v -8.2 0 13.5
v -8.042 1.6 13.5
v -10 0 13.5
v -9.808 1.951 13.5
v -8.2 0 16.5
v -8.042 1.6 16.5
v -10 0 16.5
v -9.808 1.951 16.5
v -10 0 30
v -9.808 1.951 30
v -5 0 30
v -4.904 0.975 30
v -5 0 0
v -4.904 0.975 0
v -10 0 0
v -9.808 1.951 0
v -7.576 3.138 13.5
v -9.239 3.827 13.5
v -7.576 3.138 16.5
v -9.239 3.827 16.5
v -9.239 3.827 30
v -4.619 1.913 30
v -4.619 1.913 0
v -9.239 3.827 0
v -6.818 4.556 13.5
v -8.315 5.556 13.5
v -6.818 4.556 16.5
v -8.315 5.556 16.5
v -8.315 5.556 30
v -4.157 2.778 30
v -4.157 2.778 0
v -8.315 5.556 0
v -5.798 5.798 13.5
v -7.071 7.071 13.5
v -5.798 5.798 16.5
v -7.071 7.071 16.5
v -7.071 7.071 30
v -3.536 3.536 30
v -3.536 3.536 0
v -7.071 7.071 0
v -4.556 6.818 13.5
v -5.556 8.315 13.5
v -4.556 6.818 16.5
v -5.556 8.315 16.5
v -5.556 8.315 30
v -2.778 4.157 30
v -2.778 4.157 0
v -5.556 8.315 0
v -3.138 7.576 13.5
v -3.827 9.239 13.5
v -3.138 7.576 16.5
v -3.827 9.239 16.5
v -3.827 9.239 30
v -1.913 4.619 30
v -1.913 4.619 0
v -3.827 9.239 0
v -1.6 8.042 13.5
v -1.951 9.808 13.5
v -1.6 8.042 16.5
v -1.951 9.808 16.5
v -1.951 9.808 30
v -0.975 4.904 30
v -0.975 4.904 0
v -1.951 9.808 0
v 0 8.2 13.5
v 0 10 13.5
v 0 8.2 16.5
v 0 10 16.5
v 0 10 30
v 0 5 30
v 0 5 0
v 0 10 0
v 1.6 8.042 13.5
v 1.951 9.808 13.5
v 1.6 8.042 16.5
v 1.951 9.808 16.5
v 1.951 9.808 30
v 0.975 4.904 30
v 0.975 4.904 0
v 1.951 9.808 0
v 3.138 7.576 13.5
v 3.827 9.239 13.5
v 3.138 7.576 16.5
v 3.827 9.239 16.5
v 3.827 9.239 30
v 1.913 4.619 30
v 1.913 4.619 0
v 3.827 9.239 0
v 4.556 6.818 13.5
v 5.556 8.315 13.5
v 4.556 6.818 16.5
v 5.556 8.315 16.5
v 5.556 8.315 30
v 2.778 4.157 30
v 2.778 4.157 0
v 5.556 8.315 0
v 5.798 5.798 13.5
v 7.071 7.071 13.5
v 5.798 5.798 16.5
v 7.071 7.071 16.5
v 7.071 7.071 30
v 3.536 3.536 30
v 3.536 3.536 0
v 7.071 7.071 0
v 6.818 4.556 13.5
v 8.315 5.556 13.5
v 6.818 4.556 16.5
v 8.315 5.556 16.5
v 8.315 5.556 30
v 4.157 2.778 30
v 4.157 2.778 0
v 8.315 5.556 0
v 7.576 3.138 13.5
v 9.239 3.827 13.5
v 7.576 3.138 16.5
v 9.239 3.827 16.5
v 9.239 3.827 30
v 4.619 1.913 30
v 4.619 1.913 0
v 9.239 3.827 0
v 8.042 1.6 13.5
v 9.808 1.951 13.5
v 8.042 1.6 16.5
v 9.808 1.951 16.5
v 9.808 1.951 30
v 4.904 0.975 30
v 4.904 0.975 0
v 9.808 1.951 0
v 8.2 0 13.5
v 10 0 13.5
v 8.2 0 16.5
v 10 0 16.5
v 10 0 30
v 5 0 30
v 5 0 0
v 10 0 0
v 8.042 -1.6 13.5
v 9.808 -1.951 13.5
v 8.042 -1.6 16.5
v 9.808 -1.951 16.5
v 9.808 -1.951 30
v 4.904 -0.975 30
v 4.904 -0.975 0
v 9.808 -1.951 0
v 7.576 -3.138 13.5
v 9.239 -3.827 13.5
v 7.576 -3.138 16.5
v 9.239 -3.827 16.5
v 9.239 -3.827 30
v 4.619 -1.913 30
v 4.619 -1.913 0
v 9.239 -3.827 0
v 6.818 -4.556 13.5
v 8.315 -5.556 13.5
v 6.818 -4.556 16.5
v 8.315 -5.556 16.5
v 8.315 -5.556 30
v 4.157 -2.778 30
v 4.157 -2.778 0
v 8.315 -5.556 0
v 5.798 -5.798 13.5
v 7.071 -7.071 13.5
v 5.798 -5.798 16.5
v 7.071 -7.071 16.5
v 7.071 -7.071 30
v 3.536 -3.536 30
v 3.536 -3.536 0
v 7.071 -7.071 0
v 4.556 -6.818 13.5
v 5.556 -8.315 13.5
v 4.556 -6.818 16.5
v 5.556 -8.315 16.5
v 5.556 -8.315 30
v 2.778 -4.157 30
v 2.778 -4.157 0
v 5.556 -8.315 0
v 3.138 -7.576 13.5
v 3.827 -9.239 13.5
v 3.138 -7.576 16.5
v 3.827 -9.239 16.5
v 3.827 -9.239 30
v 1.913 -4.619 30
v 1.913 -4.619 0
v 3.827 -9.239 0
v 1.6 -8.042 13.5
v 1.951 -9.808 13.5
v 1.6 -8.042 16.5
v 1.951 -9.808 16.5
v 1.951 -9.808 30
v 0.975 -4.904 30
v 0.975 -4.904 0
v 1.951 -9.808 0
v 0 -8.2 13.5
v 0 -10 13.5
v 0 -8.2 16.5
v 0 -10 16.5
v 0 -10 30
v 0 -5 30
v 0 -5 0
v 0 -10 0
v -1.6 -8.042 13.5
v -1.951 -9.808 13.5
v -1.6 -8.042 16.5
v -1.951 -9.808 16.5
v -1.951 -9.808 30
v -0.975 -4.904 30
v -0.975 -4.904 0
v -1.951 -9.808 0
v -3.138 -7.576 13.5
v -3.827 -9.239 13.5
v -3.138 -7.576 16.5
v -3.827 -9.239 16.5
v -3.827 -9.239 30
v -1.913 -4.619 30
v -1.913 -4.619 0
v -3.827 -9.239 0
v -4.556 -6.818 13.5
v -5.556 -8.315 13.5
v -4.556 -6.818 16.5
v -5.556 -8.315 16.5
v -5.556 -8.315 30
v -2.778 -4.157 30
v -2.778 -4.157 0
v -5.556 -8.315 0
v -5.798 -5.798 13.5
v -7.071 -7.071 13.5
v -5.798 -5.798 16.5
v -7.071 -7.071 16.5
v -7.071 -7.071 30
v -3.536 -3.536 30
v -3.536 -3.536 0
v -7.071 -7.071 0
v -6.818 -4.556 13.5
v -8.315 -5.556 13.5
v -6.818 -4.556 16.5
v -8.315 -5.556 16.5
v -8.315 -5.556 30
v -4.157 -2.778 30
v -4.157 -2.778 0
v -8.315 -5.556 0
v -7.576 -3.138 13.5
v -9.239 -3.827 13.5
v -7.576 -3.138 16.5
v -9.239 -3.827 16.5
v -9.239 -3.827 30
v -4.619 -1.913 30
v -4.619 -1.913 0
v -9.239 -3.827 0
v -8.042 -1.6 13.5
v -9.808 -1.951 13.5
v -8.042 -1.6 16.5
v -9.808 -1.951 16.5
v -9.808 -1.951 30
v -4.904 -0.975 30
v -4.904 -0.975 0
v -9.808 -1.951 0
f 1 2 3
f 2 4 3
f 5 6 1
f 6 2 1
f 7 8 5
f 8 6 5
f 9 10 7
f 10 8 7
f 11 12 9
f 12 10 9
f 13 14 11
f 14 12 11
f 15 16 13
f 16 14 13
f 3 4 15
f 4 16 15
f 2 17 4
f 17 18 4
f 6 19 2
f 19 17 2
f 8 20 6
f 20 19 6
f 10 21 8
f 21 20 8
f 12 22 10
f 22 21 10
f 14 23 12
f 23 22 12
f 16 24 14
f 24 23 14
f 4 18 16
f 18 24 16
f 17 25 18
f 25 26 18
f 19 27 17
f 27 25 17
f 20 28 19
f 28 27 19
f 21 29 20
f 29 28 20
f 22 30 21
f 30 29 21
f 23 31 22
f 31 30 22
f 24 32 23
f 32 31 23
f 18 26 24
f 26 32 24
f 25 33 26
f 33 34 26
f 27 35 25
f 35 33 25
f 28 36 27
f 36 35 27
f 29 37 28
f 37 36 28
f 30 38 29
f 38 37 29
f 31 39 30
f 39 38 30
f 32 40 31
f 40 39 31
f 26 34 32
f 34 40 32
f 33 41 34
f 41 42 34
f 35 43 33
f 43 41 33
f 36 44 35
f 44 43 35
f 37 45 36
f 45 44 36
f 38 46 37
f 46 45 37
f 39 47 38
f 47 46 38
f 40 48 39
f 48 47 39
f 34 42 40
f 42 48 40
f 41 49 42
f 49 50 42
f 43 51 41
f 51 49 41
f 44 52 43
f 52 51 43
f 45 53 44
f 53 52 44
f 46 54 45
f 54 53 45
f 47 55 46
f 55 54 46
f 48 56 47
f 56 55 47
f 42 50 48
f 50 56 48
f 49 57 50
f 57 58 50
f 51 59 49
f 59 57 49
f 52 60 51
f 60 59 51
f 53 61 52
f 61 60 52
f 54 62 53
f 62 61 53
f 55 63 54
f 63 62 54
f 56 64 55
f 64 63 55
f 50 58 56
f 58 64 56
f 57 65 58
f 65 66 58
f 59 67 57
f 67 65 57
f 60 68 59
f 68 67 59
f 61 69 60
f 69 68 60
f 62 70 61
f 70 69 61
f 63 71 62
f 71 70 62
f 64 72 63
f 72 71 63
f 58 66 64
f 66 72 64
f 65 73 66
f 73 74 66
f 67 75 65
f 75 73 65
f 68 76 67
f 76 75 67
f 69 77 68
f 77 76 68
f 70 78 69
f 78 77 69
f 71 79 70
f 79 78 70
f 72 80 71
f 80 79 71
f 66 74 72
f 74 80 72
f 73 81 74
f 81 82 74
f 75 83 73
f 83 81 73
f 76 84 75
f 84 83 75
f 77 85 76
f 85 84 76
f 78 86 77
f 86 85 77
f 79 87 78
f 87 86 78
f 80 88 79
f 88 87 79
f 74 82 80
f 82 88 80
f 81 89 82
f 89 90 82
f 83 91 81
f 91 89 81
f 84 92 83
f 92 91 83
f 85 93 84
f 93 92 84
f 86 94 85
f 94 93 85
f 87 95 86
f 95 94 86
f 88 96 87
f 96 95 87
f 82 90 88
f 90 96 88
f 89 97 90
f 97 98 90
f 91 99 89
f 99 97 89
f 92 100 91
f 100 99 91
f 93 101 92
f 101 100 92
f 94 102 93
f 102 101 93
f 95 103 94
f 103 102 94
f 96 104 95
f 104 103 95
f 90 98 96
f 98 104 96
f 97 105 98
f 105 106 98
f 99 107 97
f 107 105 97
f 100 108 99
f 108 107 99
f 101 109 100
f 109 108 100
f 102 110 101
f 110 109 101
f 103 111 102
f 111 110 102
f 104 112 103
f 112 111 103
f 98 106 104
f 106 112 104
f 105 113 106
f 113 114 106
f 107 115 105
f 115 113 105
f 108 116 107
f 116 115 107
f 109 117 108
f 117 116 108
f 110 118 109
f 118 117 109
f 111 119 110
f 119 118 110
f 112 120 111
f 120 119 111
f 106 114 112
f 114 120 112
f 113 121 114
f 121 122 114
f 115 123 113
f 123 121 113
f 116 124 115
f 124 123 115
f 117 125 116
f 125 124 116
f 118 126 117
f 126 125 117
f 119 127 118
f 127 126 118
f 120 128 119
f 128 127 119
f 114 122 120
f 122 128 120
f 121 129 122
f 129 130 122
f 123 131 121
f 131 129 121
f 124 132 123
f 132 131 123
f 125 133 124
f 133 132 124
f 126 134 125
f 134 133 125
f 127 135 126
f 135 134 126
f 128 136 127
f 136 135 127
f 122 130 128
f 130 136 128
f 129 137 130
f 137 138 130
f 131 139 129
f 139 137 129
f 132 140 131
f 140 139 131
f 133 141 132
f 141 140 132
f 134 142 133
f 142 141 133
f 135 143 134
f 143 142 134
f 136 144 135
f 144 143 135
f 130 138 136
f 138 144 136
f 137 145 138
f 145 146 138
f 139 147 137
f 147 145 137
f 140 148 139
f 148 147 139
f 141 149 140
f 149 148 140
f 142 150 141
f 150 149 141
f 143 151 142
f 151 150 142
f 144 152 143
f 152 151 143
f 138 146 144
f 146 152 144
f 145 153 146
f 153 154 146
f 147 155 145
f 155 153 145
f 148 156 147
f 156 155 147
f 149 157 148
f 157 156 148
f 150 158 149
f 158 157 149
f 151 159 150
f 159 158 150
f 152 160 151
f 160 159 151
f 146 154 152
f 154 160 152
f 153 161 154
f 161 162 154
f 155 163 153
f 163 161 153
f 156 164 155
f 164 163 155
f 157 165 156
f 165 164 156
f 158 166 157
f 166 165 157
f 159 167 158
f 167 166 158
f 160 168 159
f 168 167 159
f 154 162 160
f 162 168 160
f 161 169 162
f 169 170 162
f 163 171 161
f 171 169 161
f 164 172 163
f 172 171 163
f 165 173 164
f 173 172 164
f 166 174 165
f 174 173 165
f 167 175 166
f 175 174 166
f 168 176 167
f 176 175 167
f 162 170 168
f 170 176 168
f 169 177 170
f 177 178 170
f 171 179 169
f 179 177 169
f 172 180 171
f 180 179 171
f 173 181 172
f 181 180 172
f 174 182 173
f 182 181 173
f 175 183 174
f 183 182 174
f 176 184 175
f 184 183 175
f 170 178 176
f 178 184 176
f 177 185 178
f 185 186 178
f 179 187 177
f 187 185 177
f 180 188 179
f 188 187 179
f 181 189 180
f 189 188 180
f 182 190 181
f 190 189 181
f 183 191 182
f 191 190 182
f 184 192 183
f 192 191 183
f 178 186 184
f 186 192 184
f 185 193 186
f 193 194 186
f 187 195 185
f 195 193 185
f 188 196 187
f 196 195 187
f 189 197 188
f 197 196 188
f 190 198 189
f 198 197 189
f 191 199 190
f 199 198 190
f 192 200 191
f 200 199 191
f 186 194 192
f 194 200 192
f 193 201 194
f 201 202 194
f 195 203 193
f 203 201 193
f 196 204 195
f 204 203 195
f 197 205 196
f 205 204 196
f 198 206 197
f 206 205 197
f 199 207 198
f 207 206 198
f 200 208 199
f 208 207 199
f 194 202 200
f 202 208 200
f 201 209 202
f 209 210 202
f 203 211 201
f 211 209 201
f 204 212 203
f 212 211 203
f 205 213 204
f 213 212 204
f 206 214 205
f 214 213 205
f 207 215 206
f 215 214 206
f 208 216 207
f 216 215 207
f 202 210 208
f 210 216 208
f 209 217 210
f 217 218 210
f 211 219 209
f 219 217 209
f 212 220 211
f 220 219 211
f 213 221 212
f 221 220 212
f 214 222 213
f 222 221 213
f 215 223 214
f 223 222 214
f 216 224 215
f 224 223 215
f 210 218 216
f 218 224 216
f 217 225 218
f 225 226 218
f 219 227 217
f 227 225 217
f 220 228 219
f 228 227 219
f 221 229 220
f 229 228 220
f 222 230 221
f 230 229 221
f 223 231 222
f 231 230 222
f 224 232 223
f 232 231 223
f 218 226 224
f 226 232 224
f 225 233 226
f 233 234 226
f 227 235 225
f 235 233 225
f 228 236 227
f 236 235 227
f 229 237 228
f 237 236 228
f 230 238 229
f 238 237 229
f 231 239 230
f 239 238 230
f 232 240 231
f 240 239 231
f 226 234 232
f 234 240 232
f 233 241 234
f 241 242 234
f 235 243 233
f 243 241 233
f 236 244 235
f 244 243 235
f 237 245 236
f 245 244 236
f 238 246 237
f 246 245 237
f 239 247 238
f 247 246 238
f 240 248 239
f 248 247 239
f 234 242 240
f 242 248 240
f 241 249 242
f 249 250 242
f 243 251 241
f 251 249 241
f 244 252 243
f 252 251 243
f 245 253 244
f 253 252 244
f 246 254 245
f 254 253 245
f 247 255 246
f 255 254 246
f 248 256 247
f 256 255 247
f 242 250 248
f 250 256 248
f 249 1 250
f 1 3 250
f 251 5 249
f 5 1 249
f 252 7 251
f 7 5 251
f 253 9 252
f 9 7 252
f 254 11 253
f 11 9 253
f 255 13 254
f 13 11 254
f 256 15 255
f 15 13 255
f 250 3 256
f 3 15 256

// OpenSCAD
$fn = 32;

// ----------------------------------------------------------------------
// Grooved revolve: plain_grooves, bore R5
// ----------------------------------------------------------------------

// --- parameters (mm) ---
bore_r = 5;               // bore radius
outer_r = 10;             // outer radius of the body
total_h = 30;             // overall height, Z
wall = 5;                 // radial wall thickness
groove_w = 3;             // groove width
groove_d = 1.8;           // groove depth
grooves = 1;              // number of outer grooves

bbox_x = 2 * outer_r;  // full diameter
bore_d = 2 * bore_r;  // bore diameter
body_d = 2 * outer_r;  // body diameter
revolve_angle = 360;  // full turn around the Z axis

profile = [[5, 0], [10, 0], [10, 13.5], [8.2, 13.5], [8.2, 16.5], [10, 16.5], [10, 30], [5, 30]];  // primary outline, 8 points, counter clockwise

// --- the one profile operation ---
rotate_extrude(angle = revolve_angle) polygon(points = profile);
